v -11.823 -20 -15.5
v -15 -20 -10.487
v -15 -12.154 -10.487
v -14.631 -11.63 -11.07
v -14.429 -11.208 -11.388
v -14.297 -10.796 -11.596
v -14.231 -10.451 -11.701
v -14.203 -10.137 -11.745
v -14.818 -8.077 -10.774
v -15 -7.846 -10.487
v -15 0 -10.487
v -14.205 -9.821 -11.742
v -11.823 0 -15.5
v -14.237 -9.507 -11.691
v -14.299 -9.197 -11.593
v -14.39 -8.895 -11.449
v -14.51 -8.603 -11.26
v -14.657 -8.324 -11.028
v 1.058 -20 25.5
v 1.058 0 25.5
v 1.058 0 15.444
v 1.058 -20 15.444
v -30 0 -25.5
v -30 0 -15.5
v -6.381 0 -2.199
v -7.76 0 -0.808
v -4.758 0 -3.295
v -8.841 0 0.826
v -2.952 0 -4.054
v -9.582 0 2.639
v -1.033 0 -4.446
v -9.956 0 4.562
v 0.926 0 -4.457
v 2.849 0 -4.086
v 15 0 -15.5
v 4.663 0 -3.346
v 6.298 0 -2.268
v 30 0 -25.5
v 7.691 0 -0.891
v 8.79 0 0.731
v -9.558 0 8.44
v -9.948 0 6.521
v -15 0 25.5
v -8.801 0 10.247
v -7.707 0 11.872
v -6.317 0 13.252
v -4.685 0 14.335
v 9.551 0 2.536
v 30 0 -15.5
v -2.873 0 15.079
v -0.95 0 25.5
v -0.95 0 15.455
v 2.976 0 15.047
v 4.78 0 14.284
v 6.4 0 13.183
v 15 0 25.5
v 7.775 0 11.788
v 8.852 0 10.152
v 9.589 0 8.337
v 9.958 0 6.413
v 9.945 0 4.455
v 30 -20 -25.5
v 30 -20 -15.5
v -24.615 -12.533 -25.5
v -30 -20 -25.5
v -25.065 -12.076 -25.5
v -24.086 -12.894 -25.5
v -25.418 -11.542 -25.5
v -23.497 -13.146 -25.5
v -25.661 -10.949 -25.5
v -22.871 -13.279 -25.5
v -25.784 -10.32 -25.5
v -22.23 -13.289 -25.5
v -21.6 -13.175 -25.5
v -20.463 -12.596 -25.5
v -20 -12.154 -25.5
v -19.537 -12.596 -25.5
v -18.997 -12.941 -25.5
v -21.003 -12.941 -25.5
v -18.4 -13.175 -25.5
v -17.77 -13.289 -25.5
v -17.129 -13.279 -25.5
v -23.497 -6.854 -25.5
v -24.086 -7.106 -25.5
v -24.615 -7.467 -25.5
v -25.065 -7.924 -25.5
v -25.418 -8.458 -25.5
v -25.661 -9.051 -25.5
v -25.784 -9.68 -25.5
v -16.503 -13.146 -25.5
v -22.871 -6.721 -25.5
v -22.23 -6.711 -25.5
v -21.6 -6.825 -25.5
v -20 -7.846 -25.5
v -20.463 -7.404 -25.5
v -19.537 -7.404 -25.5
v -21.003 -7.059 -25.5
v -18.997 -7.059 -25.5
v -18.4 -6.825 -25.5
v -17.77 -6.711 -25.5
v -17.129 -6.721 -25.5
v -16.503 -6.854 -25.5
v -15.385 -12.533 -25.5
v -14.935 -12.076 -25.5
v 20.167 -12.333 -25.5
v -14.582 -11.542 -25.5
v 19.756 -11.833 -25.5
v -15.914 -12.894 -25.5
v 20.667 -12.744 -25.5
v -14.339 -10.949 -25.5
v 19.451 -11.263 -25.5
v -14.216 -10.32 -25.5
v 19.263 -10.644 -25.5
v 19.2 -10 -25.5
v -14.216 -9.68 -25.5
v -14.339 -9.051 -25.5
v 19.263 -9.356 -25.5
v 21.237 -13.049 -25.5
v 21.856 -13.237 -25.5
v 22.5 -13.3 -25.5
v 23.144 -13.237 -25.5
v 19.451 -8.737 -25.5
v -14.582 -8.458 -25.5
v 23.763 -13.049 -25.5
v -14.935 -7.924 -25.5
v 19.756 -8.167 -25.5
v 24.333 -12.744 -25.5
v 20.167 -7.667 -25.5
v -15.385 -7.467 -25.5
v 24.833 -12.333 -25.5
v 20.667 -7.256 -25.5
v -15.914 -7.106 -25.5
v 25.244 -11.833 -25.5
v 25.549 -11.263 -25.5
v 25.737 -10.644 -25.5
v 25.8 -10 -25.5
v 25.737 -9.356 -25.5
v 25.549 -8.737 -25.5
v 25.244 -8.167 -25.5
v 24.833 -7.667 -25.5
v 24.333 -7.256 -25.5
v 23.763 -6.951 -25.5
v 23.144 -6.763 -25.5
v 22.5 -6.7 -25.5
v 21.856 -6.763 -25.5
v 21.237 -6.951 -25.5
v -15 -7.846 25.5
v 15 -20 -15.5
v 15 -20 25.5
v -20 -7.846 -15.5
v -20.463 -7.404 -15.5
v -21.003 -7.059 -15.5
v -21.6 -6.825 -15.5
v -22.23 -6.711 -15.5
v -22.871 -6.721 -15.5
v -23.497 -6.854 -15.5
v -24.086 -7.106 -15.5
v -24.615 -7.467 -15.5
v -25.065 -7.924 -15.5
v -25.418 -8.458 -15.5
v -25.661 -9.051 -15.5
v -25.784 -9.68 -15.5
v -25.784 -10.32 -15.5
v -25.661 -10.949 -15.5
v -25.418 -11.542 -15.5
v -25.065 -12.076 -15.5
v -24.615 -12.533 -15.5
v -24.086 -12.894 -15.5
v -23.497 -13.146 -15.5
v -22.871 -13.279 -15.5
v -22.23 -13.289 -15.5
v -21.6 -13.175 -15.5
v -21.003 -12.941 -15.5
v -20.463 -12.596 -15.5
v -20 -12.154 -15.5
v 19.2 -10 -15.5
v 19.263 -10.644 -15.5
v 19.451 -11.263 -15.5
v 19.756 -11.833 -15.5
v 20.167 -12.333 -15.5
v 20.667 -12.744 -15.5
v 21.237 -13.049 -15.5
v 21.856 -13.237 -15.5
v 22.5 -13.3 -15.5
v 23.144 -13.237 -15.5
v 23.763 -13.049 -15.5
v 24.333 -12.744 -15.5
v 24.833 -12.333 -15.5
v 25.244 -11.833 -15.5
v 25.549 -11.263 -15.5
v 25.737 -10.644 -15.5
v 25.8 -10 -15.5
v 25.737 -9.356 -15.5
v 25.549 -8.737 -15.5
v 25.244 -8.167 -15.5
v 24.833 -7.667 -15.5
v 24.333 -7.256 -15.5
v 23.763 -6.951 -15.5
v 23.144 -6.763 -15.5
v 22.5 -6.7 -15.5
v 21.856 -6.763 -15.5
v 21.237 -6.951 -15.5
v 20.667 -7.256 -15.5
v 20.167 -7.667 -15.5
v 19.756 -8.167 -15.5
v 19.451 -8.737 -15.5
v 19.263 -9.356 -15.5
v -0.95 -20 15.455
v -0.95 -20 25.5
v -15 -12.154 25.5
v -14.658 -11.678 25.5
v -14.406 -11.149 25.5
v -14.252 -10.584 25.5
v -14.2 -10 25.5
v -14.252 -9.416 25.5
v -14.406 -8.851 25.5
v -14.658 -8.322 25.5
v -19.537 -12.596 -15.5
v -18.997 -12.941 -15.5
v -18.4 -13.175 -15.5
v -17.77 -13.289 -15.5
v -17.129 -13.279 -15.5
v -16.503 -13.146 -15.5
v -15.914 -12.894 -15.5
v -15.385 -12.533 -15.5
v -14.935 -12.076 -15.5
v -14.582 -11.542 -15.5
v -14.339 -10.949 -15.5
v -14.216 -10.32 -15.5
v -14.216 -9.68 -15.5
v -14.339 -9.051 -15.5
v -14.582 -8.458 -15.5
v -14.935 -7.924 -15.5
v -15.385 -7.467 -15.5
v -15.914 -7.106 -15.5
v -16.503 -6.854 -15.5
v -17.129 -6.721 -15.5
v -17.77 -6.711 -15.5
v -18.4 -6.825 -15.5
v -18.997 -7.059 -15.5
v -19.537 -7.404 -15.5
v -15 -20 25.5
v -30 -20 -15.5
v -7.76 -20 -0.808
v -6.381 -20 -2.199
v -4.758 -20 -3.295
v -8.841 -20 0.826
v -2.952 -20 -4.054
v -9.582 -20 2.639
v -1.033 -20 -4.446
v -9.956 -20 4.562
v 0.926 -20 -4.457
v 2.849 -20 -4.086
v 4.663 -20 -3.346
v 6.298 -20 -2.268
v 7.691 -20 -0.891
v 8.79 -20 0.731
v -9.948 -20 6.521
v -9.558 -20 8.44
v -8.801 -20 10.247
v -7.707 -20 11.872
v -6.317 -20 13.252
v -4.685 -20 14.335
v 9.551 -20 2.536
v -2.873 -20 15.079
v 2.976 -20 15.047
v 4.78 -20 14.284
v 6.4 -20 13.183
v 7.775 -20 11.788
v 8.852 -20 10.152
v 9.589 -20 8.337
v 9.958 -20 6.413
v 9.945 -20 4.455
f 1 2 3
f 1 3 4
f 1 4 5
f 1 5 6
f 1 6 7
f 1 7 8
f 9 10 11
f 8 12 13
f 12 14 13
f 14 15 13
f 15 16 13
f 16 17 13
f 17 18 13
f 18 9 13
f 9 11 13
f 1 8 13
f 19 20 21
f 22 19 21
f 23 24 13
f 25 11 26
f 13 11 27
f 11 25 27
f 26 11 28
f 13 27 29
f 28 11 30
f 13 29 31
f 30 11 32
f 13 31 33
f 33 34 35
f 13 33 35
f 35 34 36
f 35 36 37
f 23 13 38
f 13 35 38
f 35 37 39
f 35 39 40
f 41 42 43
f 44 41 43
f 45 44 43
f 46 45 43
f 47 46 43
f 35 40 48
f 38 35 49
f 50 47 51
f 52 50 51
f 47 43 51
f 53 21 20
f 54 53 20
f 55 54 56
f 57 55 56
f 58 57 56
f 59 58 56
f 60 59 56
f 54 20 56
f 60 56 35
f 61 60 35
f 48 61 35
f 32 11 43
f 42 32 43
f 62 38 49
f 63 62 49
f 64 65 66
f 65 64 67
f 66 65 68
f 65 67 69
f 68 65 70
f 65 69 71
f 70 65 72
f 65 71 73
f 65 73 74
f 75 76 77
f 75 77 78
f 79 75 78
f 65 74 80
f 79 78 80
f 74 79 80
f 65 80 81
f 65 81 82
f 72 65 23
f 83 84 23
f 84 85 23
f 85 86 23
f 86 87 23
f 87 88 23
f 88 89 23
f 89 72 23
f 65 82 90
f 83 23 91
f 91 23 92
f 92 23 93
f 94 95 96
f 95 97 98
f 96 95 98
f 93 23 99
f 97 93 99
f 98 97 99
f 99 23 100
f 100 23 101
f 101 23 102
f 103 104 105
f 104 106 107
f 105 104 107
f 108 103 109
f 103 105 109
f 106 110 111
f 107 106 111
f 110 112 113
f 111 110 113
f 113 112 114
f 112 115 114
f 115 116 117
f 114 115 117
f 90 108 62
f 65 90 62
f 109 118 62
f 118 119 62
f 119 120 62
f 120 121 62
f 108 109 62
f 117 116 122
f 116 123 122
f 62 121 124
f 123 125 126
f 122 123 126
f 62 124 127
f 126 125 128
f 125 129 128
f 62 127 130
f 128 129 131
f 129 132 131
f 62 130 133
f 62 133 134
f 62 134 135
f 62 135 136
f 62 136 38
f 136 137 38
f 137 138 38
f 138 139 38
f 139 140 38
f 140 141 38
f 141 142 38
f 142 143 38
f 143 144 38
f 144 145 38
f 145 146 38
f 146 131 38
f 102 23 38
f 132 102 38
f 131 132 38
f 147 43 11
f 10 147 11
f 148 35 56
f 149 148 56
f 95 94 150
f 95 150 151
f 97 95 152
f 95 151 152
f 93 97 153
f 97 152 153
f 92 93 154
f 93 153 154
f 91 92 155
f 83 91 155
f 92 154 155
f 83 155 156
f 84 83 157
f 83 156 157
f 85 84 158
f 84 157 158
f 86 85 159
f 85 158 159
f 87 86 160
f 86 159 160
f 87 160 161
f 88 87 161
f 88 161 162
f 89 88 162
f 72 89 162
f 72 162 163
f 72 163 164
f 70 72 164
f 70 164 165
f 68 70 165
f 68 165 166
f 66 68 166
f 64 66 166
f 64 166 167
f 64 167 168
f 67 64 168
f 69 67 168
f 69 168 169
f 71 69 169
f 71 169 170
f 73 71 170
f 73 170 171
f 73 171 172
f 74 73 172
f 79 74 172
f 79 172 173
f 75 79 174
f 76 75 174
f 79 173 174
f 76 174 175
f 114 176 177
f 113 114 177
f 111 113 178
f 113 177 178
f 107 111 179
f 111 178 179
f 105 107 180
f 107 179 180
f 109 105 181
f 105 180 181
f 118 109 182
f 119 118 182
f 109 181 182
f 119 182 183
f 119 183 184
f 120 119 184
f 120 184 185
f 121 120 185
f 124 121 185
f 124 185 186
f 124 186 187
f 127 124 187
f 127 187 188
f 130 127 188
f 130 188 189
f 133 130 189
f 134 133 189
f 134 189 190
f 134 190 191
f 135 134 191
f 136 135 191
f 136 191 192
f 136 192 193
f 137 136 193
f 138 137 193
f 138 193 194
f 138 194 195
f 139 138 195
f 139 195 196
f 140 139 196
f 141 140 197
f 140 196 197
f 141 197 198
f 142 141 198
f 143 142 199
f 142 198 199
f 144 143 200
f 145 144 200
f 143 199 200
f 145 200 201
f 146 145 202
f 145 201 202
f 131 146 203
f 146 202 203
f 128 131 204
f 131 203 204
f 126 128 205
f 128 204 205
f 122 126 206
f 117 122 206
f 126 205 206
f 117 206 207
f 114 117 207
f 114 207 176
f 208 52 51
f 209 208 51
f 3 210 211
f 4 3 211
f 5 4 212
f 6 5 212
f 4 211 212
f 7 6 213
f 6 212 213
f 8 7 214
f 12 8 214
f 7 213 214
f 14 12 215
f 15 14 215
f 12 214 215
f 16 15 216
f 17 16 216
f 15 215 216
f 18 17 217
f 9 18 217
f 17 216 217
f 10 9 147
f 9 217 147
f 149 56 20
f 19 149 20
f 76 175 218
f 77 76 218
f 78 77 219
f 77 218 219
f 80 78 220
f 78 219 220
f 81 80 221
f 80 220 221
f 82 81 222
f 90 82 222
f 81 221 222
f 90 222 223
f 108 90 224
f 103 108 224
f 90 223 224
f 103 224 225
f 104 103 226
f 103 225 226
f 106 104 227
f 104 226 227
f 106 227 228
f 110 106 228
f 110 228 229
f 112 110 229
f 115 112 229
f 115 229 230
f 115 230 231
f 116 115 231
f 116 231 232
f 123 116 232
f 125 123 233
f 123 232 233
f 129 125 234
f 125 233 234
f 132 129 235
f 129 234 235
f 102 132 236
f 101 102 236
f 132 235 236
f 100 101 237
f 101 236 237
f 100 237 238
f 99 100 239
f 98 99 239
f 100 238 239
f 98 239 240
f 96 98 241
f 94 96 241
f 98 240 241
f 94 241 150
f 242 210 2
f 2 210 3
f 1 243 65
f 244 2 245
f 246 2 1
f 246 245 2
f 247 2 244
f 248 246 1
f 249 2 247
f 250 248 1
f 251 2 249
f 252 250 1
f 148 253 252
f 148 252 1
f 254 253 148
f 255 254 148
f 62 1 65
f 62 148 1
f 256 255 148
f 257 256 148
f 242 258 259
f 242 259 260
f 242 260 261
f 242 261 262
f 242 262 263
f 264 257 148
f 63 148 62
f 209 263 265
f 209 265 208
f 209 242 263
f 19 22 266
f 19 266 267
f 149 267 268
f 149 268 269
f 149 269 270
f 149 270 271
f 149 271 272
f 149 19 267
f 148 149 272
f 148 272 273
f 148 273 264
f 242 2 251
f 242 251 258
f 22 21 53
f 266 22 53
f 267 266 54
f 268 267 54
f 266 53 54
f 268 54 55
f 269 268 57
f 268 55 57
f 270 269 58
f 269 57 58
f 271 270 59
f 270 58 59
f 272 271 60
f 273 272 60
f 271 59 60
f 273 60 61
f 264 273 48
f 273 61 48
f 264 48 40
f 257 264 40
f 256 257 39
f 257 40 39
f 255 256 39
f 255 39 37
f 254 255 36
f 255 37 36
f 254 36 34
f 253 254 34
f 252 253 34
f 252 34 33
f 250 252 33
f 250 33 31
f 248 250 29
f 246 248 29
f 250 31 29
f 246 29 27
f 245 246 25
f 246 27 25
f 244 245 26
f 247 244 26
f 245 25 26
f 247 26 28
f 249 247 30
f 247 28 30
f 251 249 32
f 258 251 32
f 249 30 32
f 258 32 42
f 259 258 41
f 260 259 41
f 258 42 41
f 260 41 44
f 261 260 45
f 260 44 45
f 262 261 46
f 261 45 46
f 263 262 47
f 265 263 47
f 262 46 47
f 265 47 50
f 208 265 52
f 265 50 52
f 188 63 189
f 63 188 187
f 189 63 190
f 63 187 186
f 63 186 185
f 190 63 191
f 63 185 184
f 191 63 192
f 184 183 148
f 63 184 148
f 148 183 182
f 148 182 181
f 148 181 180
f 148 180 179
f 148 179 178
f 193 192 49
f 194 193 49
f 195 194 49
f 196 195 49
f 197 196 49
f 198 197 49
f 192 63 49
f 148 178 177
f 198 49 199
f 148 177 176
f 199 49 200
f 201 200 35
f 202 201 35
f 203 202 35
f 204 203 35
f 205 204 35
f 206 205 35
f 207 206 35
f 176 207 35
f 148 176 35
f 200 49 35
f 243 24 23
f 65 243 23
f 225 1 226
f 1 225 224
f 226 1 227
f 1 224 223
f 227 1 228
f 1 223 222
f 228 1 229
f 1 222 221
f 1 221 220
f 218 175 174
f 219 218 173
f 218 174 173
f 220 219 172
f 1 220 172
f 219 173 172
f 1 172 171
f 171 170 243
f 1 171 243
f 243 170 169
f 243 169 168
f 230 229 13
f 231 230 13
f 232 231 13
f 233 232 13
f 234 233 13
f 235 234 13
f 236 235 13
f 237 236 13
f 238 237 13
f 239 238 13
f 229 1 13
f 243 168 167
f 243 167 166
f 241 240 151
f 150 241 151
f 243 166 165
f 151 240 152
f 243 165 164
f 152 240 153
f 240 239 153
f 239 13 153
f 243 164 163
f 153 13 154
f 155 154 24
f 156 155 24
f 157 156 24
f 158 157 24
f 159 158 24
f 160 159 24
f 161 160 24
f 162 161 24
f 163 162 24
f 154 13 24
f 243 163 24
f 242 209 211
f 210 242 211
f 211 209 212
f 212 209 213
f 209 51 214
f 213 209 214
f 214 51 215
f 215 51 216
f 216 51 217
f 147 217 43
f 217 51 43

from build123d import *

# Parameters (mm, degrees)
F1_DEPTH = 20
F3_D     = 6.6
F4_D     = 6.6
F5_D     = 6.6


with BuildPart() as f1:
    # F0 (on Front) → F1 (new body)
    with BuildSketch(Plane.XZ):
        with BuildLine():
            Line((-30, -25.5), (30, -25.5))
            Line((30, -25.5), (30, -15.5))
            Line((30, -15.5), (15, -15.5))
            Line((15, -15.5), (15, 25.5))
            Line((15, 25.5), (1.057532, 25.5))
            Line((1.057532, 25.5), (1.057532, 15.443924))
            ThreePointArc((1.057532, 15.443924), (-0.053951, -4.499854), (-0.950175, 15.454756))
            Line((-0.950175, 15.454756), (-0.950175, 25.5))
            Line((-0.950175, 25.5), (-15, 25.5))
            Line((-15, 25.5), (-15, -10.487244))
            Line((-15, -10.487244), (-11.823214, -15.5))
            Line((-11.823214, -15.5), (-15, -15.5))
            Line((-15, -15.5), (-30, -15.5))
            Line((-30, -15.5), (-30, -25.5))
        make_face()
    extrude(amount=F1_DEPTH)

    # F3 (through all)
    with Locations(Plane(origin=(0, 0, -25.5), x_dir=(1, 0, 0), z_dir=(0, 0, -1))):
        with Locations((-22.5, 10)):
            Hole(F3_D / 2)

    # F4 (through all)
    with Locations(Plane(origin=(0, 0, -25.5), x_dir=(1, 0, 0), z_dir=(0, 0, -1))):
        with Locations((22.5, 10)):
            Hole(F4_D / 2)

    # F5 (through all)
    with Locations(Plane(origin=(0, 0, -25.5), x_dir=(1, 0, 0), z_dir=(0, 0, -1))):
        with Locations((-17.5, 10)):
            Hole(F5_D / 2)


solid = f1.part
